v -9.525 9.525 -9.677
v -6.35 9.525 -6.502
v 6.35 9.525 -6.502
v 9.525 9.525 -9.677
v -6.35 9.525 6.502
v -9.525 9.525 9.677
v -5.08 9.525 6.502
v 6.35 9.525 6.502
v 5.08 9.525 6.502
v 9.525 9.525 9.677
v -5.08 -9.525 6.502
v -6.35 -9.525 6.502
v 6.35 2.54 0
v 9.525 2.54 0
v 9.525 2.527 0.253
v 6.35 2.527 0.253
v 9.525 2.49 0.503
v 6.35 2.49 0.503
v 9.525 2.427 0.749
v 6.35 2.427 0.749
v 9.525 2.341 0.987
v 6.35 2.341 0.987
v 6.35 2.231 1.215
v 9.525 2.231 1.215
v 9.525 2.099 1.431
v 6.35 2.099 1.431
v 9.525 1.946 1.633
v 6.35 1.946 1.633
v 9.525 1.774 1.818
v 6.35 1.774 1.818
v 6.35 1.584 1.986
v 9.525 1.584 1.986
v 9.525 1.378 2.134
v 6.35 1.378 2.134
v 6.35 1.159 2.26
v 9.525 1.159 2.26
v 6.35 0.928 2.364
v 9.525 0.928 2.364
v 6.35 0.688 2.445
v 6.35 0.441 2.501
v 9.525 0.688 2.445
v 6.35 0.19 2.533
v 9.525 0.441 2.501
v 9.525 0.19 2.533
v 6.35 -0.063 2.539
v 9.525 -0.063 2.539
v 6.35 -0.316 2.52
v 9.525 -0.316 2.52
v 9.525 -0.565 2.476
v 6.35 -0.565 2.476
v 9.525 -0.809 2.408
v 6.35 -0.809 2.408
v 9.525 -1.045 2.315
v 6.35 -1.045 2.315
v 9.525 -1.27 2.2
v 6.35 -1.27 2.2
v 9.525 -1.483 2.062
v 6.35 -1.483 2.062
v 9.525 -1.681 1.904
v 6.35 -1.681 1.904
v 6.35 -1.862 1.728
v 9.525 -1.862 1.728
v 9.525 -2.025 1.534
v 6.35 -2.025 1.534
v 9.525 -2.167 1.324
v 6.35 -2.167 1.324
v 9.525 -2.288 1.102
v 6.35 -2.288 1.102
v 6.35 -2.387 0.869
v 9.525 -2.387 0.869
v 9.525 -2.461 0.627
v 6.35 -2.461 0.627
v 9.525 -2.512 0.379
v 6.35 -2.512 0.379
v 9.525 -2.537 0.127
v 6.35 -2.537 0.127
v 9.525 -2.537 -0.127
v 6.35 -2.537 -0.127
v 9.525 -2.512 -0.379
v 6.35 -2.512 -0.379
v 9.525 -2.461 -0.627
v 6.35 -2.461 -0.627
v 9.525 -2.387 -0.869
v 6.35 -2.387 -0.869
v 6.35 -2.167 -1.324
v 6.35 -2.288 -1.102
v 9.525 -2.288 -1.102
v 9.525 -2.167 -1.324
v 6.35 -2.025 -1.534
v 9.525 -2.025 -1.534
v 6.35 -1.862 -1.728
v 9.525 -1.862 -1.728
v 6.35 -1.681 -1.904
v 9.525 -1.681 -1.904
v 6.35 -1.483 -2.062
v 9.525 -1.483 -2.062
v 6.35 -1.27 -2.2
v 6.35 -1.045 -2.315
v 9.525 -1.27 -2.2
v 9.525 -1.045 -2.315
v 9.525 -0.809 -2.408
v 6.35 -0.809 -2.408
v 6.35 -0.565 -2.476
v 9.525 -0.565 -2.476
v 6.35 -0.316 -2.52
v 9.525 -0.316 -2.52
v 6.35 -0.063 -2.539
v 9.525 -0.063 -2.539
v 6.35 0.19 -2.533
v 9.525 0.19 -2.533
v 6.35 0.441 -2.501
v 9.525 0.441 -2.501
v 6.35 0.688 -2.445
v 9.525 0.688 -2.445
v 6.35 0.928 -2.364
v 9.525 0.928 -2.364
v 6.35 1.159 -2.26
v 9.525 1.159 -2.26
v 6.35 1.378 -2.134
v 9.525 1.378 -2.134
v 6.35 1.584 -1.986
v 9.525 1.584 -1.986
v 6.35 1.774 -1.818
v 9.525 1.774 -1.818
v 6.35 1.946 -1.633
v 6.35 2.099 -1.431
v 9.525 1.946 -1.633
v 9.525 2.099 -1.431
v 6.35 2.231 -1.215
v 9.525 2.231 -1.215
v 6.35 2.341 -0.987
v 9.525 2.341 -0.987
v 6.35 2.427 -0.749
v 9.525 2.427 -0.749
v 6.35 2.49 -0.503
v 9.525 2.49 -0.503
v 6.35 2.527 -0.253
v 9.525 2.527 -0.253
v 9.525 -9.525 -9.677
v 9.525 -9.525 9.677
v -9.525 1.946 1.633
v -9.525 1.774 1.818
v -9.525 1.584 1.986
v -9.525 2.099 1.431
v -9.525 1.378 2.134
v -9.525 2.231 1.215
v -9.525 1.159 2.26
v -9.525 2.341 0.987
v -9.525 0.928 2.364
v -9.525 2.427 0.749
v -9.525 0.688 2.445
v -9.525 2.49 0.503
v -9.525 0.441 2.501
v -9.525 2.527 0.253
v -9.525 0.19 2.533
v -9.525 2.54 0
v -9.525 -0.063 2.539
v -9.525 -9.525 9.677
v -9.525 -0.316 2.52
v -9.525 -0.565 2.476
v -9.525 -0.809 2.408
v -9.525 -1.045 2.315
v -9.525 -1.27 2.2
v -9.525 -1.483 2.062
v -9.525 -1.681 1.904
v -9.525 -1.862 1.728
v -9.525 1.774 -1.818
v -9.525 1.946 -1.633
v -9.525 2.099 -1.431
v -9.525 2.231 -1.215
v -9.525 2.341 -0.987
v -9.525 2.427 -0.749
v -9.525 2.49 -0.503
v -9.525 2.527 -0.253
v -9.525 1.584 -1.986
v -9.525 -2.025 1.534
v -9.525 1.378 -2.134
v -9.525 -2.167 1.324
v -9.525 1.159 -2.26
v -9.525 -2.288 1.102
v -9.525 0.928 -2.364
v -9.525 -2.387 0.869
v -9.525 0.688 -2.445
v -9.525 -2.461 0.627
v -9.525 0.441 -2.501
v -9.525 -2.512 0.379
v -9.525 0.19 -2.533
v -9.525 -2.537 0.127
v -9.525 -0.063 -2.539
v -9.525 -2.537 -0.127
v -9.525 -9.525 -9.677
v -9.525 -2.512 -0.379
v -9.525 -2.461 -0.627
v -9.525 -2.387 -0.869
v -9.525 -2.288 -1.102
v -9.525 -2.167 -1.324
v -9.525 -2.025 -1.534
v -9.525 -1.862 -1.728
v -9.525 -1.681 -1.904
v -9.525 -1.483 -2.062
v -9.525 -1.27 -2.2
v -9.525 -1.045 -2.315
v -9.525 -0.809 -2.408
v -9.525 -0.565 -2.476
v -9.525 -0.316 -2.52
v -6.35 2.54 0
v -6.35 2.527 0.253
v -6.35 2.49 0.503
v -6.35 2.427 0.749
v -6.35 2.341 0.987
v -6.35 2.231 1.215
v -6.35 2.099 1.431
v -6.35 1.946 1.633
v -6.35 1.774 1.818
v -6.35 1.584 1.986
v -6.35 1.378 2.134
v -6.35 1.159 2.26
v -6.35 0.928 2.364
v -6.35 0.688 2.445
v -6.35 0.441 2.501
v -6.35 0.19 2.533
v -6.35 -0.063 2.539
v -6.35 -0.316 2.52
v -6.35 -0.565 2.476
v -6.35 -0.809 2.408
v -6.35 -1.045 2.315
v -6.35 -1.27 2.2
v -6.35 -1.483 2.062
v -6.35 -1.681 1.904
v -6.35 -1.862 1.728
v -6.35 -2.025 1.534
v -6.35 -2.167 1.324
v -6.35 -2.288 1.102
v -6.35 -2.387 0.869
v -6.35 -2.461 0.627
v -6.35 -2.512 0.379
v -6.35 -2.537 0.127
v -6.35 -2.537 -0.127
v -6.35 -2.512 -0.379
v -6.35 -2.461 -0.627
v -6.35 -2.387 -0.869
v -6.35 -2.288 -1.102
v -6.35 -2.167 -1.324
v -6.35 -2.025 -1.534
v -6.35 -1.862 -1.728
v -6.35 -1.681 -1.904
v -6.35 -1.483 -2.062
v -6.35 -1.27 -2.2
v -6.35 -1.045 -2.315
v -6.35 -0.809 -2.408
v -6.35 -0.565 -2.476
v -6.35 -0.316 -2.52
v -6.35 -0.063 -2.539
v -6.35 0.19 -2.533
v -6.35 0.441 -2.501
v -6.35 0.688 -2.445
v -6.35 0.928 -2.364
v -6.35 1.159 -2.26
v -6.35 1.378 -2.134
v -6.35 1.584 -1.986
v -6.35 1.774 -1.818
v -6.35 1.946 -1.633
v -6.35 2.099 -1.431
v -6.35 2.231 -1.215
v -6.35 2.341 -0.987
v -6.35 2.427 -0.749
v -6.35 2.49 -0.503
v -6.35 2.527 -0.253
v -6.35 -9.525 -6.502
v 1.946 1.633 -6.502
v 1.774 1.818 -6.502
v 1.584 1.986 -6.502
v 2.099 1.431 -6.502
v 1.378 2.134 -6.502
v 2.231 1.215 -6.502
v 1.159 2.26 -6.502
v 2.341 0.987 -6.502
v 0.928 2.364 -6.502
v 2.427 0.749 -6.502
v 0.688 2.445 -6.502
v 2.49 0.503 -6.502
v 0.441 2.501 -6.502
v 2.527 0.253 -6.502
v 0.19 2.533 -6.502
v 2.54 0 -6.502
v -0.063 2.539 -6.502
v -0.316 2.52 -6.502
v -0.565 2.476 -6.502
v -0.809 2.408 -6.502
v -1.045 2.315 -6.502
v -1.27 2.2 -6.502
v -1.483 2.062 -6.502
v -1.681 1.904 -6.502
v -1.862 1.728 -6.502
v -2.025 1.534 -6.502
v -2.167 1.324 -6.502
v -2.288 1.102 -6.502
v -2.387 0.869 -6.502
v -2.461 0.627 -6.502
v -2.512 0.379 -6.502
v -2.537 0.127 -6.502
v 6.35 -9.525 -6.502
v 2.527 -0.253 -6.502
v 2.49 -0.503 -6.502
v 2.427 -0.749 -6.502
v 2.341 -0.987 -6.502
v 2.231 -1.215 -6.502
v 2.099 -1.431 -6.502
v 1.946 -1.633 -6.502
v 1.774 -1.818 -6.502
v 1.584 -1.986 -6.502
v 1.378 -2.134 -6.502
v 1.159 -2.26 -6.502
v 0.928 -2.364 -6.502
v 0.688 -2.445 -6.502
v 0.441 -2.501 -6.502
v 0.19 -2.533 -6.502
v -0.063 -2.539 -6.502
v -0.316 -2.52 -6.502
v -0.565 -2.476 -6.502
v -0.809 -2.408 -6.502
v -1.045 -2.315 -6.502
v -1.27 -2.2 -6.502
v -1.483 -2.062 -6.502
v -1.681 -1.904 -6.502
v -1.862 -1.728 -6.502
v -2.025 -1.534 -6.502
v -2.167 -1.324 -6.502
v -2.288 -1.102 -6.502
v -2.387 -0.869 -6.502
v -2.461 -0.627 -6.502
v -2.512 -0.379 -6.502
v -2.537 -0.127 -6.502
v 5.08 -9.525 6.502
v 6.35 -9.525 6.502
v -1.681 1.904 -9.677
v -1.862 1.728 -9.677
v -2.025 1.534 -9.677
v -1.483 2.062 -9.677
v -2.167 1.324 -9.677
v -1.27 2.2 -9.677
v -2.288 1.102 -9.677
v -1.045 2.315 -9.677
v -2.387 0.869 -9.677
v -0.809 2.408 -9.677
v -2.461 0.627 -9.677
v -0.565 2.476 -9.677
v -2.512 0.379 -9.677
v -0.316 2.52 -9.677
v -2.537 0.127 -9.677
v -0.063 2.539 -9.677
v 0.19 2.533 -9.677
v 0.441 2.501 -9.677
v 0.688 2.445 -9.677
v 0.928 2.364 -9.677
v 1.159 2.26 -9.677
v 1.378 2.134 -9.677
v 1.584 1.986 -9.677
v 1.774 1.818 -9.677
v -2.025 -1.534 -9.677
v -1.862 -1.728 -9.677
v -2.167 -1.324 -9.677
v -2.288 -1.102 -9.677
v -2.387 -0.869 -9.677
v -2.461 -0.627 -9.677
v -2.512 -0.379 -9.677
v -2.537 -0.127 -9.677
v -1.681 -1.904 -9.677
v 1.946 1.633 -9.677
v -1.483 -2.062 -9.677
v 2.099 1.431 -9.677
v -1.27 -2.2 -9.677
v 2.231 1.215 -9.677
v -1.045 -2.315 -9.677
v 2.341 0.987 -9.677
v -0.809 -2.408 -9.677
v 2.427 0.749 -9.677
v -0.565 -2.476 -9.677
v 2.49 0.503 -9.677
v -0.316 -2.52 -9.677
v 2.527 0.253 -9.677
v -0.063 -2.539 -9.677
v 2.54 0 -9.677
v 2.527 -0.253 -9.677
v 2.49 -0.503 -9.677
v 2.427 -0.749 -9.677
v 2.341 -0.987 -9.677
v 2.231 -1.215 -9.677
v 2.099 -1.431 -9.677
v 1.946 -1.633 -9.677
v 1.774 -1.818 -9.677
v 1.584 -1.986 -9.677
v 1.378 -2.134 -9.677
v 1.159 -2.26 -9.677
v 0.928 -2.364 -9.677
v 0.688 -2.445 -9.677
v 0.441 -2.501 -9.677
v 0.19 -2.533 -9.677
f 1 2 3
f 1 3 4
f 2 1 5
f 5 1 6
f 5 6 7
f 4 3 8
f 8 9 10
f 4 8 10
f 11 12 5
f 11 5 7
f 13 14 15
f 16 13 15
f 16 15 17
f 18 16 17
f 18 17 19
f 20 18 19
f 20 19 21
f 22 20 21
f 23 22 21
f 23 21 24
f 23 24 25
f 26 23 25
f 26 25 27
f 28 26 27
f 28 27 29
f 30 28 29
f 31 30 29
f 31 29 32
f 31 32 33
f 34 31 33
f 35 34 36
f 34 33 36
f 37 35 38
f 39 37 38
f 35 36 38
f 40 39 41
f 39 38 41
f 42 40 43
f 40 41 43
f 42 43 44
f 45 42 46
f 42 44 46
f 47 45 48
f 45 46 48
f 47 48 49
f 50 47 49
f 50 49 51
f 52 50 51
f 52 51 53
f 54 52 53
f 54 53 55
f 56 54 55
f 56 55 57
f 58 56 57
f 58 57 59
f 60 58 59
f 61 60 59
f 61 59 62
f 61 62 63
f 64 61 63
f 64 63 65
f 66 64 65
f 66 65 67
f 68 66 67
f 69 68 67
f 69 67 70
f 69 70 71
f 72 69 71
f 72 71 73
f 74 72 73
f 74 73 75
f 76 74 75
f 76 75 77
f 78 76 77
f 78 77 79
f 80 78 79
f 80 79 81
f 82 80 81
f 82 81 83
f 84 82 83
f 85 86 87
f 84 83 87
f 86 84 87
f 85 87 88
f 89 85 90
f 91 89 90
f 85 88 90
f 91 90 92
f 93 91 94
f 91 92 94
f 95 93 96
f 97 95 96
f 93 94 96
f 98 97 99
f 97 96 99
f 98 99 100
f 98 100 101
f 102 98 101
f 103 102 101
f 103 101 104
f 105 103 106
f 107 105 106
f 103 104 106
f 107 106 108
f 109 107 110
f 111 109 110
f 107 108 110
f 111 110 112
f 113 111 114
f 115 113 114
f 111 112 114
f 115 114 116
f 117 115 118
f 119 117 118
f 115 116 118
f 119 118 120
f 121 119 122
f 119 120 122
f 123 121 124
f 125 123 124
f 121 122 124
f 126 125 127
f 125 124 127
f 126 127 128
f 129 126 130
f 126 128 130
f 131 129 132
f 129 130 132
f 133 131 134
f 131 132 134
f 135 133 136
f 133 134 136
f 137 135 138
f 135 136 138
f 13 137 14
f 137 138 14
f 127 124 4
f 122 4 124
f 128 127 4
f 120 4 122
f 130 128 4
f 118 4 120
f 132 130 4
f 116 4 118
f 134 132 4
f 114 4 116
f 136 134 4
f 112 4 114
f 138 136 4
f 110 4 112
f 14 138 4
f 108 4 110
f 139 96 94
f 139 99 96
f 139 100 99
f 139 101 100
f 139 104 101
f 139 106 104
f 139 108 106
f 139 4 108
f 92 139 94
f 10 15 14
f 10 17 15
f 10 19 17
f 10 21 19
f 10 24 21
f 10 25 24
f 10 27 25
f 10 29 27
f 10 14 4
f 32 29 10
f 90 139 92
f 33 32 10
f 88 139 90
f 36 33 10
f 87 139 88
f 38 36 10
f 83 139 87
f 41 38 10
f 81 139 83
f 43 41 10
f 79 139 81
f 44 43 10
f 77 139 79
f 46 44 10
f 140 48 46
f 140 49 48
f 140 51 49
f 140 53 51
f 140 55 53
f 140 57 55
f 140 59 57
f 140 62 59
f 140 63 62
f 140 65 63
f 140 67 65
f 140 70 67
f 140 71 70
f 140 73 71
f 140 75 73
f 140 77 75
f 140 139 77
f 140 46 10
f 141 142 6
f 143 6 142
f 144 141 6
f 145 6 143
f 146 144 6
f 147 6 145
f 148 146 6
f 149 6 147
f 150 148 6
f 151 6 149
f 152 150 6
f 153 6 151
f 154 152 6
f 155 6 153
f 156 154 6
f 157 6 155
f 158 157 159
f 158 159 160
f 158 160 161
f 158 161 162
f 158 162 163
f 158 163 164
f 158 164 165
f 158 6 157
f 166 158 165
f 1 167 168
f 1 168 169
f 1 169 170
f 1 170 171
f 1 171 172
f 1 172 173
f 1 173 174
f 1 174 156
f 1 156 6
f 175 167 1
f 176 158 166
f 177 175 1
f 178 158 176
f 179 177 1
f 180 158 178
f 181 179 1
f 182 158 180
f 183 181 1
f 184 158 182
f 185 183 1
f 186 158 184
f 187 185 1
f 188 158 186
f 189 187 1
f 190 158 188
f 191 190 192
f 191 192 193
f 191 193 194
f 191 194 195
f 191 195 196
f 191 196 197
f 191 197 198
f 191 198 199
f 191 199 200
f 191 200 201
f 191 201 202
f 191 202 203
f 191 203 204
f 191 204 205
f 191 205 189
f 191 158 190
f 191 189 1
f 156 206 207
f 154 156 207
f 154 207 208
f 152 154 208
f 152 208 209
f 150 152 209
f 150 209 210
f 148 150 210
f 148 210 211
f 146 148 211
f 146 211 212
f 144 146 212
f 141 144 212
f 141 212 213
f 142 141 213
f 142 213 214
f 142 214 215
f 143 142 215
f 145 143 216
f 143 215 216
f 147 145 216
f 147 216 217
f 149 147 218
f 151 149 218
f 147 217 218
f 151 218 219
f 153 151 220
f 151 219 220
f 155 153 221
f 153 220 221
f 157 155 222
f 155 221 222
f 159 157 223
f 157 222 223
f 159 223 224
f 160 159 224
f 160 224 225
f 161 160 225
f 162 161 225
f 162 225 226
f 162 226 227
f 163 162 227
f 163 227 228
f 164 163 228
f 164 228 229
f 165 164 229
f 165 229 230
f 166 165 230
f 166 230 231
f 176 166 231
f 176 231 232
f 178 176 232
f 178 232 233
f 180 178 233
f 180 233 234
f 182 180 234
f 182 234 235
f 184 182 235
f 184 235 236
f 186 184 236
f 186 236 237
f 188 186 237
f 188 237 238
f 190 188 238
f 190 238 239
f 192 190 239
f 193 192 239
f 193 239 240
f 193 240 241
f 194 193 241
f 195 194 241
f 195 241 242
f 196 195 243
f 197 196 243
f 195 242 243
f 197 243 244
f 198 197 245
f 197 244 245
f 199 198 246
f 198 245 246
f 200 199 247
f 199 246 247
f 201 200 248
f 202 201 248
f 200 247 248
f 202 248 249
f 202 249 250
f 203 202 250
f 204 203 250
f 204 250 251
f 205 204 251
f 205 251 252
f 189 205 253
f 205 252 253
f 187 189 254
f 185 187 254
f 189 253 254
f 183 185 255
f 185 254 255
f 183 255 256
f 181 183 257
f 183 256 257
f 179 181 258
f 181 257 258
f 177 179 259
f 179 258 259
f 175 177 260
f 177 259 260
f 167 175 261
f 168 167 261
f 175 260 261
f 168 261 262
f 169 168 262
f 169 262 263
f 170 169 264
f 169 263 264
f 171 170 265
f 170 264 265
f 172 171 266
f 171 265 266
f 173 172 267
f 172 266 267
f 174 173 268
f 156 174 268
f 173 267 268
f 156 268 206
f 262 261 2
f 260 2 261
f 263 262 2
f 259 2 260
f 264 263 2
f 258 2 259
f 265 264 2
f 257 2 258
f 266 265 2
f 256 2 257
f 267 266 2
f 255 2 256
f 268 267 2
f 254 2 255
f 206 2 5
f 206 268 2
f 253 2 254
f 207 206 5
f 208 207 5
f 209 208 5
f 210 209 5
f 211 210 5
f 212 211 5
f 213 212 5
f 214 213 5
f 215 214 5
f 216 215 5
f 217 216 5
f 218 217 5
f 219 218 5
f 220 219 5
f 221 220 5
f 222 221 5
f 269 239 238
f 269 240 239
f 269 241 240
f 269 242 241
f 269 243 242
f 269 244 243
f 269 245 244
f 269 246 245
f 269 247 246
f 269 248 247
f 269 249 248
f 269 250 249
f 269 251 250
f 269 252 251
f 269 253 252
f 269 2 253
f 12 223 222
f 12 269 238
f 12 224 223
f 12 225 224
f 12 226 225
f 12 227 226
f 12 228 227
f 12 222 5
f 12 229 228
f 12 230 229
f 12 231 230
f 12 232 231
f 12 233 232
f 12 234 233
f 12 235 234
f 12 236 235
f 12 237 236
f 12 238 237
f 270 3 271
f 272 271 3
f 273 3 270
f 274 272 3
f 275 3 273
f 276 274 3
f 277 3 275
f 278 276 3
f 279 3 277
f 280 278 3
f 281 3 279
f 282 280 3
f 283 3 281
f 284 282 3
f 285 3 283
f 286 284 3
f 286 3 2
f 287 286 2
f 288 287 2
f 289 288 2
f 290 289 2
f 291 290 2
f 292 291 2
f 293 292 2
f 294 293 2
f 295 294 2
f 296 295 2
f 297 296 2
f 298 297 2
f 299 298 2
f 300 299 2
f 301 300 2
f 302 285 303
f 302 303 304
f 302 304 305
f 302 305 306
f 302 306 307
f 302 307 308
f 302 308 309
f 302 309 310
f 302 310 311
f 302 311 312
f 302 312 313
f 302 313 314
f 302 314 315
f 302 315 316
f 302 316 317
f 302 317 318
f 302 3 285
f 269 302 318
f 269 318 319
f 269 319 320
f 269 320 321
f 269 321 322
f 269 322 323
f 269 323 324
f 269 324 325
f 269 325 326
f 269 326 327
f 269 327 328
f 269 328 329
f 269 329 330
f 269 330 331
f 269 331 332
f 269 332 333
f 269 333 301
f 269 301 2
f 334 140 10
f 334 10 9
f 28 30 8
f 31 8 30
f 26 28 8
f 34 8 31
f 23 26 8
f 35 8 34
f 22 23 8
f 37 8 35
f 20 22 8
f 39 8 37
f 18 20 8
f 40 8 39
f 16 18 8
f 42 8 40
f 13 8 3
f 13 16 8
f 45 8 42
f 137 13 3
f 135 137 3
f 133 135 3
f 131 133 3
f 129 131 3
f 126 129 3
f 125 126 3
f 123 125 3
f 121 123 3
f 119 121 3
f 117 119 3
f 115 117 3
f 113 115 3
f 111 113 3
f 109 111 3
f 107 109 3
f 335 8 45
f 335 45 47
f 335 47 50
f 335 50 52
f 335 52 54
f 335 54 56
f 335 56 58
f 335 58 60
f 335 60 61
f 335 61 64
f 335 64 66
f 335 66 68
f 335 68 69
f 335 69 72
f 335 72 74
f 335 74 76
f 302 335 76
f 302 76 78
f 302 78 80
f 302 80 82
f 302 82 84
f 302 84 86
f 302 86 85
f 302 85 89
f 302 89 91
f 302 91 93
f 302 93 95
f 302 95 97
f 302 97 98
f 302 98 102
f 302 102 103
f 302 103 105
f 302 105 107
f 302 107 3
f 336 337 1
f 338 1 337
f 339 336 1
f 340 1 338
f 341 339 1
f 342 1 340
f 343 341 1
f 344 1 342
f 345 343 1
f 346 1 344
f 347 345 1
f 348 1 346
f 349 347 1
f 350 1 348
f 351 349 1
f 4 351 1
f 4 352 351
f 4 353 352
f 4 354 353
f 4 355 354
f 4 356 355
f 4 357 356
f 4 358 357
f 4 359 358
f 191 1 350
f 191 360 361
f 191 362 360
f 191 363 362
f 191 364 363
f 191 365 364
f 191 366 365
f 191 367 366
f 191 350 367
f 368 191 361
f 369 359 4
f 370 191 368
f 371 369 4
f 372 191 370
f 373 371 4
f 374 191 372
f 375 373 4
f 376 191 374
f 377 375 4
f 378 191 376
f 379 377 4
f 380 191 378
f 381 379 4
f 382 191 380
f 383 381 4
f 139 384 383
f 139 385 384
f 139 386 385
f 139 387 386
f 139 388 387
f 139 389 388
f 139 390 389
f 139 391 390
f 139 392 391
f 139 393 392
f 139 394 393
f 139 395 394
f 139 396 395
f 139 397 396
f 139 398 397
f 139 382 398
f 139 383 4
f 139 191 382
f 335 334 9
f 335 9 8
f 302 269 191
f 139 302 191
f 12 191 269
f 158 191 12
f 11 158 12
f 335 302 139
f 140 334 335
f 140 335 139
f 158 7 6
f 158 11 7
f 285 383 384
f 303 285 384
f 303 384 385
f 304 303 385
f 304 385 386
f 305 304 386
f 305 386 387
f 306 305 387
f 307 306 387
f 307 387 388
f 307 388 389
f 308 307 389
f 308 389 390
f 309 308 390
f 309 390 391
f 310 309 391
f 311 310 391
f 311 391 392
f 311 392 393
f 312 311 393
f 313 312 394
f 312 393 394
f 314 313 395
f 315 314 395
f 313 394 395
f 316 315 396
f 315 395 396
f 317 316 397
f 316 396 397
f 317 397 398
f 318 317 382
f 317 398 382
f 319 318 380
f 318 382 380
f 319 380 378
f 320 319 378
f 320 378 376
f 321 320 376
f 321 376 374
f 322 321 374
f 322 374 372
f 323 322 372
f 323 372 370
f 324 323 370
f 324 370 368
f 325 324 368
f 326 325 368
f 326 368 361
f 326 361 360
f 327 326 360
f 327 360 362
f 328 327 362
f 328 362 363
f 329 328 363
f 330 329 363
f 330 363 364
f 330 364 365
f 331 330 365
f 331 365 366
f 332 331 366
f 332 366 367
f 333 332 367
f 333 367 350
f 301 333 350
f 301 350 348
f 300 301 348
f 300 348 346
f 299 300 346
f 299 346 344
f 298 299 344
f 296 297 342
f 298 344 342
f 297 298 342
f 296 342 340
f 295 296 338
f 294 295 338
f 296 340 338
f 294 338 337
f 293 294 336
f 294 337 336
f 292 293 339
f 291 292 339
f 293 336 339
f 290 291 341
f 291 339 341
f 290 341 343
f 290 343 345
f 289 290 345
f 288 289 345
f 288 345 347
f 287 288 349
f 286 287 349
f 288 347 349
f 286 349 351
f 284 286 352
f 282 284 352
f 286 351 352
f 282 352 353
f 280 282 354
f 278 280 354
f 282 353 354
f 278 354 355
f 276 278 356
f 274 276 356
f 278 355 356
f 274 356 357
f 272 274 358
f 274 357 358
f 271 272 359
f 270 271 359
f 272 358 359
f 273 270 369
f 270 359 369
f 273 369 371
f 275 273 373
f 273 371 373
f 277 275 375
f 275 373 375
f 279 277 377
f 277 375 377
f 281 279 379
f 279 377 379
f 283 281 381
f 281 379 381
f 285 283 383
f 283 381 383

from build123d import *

# Parameters (mm, degrees)
F1_DEPTH = 9.525
F2_R     = 2.54
F3_DEPTH = 19.355562
F4_R     = 2.54
F5_DEPTH = 19.051


with BuildPart() as f1:
    # F0 (on Front) → F1 (new body, symmetric)
    with BuildSketch(Plane.XZ):
        Polygon((-9.525, -9.677281), (9.525, -9.677281), (9.525, 9.677281), (5.08, 6.502281), (6.35, 6.502281), (6.35, -6.502281), (-6.35, -6.502281), (-6.35, 6.502281), (-5.08, 6.502281), (-9.525, 9.677281), align=None)
    extrude(amount=F1_DEPTH, both=True)

    # F2 (on face) → F3 (cut, through all)
    with BuildSketch(Plane(origin=(0, 0, -9.677281), x_dir=(1, 0, 0), z_dir=(0, 0, -1))):
        Circle(F2_R)
    extrude(amount=-F3_DEPTH, mode=Mode.SUBTRACT)

    # F4 (on face) → F5 (cut, through all)
    with BuildSketch(Plane.YZ.offset(9.525)):
        Circle(F4_R)
    extrude(amount=-F5_DEPTH, mode=Mode.SUBTRACT)


solid = f1.part
